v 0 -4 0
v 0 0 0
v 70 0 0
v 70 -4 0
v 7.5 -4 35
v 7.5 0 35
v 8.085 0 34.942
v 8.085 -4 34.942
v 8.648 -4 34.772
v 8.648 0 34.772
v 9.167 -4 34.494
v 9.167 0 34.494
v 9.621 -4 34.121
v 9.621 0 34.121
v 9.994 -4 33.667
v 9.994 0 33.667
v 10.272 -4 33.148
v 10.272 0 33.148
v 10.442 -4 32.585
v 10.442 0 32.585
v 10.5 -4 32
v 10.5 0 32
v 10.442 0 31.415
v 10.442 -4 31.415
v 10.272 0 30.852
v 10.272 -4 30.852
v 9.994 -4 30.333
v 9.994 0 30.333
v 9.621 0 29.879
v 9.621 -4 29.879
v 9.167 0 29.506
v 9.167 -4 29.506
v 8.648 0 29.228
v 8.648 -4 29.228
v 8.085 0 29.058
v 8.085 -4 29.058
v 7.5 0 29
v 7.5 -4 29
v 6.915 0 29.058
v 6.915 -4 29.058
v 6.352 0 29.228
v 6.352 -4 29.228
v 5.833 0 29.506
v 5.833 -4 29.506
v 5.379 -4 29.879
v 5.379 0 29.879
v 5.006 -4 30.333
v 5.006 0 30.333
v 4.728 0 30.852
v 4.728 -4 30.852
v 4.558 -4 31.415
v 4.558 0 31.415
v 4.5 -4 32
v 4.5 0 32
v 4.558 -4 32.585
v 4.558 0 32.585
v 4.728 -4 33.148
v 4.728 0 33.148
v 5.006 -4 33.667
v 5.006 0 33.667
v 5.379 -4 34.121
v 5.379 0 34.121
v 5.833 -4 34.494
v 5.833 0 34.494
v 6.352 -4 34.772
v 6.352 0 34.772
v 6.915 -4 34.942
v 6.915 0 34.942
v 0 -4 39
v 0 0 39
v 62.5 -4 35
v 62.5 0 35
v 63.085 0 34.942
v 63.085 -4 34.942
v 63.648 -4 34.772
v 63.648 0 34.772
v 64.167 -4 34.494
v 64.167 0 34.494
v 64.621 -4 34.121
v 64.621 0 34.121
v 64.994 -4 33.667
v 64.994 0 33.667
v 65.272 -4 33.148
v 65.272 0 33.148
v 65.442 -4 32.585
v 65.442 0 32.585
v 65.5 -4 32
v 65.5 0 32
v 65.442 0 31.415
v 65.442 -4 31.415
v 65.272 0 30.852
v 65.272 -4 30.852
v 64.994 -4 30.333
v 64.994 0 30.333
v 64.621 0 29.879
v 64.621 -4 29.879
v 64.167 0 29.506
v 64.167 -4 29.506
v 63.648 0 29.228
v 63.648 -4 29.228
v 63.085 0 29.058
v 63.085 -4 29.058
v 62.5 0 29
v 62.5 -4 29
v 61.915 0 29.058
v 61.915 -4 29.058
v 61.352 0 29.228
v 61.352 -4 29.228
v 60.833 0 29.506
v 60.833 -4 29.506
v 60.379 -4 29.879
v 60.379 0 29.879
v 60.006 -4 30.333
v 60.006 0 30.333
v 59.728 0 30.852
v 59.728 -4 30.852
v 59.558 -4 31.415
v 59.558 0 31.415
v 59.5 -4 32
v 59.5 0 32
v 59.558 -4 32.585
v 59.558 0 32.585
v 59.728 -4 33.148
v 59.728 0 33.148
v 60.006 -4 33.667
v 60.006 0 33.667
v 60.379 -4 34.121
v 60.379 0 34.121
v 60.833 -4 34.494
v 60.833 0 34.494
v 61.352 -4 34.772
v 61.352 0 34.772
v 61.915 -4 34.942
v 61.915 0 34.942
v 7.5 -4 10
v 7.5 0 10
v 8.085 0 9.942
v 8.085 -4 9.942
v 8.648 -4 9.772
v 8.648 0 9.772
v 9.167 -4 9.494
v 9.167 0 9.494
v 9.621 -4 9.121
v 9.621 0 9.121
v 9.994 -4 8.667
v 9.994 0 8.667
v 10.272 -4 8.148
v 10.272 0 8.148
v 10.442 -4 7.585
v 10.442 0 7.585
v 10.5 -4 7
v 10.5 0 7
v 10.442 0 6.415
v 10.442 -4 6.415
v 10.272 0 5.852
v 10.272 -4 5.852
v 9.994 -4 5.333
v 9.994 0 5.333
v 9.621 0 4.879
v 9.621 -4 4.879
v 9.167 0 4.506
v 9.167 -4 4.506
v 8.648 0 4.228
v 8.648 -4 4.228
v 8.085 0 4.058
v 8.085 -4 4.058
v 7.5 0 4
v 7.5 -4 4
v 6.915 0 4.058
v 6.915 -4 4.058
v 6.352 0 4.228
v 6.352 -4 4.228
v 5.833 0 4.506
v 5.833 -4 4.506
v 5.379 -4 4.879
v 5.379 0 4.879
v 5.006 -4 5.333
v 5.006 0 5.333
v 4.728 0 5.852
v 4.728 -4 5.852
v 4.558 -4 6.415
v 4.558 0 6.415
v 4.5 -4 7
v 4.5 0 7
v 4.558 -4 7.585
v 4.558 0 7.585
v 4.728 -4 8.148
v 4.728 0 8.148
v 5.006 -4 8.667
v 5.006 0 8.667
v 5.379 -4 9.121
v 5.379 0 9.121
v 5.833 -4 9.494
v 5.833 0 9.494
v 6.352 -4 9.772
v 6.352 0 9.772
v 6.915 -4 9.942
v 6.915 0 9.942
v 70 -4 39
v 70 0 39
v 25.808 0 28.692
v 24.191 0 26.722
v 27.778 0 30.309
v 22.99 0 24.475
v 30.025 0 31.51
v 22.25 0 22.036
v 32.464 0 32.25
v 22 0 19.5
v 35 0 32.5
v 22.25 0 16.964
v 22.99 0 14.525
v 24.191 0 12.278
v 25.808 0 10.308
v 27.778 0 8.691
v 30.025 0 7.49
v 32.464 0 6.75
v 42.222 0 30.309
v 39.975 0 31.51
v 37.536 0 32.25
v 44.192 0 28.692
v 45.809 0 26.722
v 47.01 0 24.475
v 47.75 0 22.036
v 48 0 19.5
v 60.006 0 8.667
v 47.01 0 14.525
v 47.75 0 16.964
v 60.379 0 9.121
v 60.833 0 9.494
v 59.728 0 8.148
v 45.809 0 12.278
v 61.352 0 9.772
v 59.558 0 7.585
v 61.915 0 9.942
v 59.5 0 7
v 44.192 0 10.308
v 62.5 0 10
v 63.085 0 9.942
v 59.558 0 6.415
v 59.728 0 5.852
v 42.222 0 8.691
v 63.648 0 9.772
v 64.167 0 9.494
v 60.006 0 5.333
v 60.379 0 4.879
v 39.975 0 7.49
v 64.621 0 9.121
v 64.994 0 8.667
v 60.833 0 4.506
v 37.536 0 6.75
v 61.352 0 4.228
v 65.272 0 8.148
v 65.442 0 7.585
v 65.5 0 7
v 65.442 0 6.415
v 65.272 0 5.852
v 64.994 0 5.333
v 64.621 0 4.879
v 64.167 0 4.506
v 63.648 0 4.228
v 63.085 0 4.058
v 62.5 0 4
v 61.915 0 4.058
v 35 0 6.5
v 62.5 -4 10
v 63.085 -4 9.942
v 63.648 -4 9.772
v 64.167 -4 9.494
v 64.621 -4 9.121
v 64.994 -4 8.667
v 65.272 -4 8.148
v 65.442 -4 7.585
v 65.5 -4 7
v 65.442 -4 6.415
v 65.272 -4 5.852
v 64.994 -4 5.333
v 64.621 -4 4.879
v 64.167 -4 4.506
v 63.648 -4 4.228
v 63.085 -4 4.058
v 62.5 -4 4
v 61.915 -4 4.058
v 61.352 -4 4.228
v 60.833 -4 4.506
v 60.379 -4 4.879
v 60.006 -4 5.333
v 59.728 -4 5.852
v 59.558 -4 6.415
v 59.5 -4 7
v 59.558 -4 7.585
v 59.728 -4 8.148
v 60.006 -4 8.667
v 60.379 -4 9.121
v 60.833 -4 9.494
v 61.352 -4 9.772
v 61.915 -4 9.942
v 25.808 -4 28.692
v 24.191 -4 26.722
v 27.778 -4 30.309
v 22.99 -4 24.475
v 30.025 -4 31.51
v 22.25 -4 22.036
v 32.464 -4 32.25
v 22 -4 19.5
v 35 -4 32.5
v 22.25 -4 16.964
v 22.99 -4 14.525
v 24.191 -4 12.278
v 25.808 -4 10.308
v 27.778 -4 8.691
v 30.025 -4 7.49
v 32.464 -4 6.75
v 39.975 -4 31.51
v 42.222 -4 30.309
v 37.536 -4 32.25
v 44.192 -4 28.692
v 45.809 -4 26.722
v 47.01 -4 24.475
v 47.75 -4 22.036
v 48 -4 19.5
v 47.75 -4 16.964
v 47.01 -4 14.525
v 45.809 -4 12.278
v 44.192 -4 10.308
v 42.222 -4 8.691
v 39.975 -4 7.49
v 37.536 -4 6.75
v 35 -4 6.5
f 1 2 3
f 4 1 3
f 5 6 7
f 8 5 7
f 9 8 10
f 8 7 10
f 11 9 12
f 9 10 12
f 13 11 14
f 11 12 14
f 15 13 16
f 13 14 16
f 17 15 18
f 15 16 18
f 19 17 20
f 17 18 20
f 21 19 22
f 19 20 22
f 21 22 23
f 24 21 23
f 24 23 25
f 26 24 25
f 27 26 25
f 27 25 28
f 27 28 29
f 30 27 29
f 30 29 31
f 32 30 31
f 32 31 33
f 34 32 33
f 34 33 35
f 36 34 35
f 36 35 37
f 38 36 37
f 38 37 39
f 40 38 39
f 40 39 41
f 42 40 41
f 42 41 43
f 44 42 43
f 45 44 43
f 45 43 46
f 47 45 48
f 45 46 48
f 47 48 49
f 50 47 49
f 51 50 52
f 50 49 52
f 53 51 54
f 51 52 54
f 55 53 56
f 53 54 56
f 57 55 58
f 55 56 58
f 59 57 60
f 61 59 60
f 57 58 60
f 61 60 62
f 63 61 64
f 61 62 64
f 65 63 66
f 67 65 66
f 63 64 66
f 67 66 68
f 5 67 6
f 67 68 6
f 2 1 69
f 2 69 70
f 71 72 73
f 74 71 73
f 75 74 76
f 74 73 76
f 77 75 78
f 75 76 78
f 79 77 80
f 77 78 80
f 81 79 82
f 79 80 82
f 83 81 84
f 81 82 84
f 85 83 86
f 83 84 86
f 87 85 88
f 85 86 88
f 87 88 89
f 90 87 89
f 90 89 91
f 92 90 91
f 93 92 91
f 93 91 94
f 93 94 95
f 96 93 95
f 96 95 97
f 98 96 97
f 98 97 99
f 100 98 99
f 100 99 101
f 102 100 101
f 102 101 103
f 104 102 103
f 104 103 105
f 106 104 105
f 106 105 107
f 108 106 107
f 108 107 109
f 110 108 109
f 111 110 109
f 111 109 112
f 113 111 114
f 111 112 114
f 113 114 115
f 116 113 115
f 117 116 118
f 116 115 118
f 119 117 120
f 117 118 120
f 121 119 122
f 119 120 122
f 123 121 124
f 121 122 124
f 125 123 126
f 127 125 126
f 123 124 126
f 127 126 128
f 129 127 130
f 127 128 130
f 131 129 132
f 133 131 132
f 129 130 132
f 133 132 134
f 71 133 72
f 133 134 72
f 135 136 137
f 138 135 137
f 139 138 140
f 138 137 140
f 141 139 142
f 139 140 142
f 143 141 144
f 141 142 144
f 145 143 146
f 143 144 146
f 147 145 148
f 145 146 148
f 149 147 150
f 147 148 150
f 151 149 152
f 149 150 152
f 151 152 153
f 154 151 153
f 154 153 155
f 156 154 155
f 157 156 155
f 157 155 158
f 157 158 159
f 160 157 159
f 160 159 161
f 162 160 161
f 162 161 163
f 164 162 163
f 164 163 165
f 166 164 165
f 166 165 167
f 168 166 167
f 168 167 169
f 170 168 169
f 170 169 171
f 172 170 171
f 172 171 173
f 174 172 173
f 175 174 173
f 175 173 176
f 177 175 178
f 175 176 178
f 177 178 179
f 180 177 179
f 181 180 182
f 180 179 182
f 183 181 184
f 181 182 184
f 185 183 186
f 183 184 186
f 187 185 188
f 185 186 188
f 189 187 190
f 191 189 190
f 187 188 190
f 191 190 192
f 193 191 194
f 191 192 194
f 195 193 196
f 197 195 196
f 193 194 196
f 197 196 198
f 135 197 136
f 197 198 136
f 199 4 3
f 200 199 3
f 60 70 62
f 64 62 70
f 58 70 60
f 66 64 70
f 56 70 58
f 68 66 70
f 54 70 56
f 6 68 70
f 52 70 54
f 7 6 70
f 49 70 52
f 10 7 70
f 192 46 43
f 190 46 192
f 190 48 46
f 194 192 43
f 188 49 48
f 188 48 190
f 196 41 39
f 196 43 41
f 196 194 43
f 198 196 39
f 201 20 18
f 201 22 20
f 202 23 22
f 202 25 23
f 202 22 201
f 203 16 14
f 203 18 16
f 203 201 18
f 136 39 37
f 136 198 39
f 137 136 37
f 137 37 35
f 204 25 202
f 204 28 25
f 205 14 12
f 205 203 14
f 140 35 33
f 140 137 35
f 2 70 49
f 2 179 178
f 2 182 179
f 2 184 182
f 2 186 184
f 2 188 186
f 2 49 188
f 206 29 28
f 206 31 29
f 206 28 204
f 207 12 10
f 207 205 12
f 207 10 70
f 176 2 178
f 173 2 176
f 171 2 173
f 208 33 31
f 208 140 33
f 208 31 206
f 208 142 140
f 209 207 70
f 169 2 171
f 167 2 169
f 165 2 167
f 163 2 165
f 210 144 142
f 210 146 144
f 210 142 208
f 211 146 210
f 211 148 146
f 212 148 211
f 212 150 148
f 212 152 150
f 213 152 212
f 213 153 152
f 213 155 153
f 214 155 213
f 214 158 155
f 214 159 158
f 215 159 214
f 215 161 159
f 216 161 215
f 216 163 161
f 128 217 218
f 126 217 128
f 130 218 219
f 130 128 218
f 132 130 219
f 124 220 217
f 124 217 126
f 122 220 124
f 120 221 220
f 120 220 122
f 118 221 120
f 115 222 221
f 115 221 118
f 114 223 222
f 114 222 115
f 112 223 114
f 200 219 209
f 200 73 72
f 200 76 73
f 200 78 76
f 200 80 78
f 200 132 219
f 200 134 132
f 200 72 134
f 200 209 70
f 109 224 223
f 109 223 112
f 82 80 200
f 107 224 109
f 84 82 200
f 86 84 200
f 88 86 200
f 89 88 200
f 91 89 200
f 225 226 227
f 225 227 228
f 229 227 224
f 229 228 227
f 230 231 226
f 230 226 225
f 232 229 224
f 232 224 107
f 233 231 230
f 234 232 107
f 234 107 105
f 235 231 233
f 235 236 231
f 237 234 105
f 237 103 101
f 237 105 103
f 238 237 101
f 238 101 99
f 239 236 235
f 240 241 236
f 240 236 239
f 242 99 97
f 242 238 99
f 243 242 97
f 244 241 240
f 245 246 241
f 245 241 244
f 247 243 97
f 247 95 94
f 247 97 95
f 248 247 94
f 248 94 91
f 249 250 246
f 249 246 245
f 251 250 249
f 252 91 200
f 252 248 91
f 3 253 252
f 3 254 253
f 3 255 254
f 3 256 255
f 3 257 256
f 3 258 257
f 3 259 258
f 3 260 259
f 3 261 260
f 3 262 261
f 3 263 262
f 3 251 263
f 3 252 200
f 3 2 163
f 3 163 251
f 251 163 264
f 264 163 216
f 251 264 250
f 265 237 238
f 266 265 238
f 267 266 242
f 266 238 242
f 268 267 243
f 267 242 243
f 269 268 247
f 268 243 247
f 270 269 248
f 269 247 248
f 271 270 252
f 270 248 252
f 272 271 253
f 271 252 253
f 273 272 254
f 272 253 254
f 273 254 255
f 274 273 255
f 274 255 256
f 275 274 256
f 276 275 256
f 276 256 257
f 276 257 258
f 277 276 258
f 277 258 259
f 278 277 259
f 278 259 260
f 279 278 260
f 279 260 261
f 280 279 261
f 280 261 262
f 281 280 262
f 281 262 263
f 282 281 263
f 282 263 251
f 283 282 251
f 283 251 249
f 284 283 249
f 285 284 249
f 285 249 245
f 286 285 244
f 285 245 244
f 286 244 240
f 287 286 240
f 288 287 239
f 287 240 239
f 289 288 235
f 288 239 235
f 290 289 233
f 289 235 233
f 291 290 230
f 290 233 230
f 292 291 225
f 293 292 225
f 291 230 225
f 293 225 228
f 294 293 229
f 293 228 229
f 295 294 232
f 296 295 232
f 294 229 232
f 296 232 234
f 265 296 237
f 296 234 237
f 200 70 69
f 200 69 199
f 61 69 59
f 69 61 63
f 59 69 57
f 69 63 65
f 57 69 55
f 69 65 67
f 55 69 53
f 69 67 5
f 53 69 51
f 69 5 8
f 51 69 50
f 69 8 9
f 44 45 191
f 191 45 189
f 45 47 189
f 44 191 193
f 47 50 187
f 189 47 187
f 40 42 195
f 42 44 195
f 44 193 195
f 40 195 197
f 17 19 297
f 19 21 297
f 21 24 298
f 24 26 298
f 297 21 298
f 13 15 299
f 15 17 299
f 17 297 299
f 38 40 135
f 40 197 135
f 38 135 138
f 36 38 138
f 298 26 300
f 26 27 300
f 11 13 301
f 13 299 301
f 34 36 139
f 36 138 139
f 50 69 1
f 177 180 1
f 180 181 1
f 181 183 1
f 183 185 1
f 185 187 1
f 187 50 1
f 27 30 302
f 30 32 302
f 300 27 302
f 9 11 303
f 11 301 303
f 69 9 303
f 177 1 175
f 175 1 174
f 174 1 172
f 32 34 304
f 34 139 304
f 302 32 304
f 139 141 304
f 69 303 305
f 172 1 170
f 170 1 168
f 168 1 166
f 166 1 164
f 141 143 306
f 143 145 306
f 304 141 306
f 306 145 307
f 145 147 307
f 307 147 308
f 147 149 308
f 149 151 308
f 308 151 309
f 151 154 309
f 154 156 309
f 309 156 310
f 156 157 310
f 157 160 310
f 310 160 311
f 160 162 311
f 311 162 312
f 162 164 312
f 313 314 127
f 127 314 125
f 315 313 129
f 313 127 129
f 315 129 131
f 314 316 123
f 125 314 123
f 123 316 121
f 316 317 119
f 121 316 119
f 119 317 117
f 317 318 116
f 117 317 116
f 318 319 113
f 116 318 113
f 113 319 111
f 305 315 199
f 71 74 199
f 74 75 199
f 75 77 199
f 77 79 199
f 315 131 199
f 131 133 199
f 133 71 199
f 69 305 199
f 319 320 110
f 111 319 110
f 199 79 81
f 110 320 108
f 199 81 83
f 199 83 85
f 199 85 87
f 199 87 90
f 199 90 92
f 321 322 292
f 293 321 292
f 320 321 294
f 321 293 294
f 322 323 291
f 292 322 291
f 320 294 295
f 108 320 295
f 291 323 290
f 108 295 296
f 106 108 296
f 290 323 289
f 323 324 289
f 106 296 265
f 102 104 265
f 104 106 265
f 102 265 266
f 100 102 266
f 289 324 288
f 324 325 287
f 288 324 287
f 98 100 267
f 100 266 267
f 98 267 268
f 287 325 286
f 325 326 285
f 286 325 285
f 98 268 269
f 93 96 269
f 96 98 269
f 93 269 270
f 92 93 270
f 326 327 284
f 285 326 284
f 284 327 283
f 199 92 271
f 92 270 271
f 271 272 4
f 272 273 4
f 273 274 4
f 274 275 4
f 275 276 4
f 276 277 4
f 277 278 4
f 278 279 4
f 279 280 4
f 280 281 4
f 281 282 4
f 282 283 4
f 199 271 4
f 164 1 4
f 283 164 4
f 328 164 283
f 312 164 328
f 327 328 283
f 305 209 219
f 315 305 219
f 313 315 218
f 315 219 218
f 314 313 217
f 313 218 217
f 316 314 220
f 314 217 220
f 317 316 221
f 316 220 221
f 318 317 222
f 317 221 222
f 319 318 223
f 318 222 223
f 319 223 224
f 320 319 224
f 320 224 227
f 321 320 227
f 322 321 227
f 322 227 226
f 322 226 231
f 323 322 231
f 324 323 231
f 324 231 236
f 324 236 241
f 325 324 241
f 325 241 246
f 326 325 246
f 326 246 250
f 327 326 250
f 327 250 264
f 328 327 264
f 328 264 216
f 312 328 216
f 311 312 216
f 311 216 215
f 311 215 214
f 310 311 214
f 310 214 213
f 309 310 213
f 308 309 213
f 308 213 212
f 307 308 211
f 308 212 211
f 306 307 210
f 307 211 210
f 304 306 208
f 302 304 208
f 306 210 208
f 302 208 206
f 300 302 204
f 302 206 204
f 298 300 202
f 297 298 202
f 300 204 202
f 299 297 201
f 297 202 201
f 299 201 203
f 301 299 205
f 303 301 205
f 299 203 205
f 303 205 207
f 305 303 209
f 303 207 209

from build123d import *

# Parameters (mm, degrees)
SKETCH_1_W          = 70
SKETCH_1_H          = 4
EXTRUDE_1_DEPTH     = 39
SKETCH_2_R          = 13
SKETCH_2_R_2        = 3
CUT_EXTRUDE_1_DEPTH = 5


with BuildPart() as part:
    # 草图1 → 凸台-拉伸1 (new body)
    with BuildSketch(Plane.XY):
        with Locations((35, -2)):
            Rectangle(SKETCH_1_W, SKETCH_1_H)
    extrude(amount=EXTRUDE_1_DEPTH)

    # 草图2 → 切除-拉伸1 (cut)
    with BuildSketch(Plane(origin=(0, 0, 0), x_dir=(1, 0, 0), z_dir=(0, 1, 0))):
        with Locations(Location((35, -19.5, 0), (0, 0, 270))):
            Circle(SKETCH_2_R)
        with Locations(Location((7.5, -7, 0), (0, 0, 270))):
            Circle(SKETCH_2_R_2)
        with Locations(Location((62.5, -7, 0), (0, 0, 270))):
            Circle(SKETCH_2_R_2)
        with Locations(Location((62.5, -32, 0), (0, 0, 270))):
            Circle(SKETCH_2_R_2)
        with Locations(Location((7.5, -32, 0), (0, 0, 270))):
            Circle(SKETCH_2_R_2)
    extrude(amount=-CUT_EXTRUDE_1_DEPTH, mode=Mode.SUBTRACT)


solid = part.part
